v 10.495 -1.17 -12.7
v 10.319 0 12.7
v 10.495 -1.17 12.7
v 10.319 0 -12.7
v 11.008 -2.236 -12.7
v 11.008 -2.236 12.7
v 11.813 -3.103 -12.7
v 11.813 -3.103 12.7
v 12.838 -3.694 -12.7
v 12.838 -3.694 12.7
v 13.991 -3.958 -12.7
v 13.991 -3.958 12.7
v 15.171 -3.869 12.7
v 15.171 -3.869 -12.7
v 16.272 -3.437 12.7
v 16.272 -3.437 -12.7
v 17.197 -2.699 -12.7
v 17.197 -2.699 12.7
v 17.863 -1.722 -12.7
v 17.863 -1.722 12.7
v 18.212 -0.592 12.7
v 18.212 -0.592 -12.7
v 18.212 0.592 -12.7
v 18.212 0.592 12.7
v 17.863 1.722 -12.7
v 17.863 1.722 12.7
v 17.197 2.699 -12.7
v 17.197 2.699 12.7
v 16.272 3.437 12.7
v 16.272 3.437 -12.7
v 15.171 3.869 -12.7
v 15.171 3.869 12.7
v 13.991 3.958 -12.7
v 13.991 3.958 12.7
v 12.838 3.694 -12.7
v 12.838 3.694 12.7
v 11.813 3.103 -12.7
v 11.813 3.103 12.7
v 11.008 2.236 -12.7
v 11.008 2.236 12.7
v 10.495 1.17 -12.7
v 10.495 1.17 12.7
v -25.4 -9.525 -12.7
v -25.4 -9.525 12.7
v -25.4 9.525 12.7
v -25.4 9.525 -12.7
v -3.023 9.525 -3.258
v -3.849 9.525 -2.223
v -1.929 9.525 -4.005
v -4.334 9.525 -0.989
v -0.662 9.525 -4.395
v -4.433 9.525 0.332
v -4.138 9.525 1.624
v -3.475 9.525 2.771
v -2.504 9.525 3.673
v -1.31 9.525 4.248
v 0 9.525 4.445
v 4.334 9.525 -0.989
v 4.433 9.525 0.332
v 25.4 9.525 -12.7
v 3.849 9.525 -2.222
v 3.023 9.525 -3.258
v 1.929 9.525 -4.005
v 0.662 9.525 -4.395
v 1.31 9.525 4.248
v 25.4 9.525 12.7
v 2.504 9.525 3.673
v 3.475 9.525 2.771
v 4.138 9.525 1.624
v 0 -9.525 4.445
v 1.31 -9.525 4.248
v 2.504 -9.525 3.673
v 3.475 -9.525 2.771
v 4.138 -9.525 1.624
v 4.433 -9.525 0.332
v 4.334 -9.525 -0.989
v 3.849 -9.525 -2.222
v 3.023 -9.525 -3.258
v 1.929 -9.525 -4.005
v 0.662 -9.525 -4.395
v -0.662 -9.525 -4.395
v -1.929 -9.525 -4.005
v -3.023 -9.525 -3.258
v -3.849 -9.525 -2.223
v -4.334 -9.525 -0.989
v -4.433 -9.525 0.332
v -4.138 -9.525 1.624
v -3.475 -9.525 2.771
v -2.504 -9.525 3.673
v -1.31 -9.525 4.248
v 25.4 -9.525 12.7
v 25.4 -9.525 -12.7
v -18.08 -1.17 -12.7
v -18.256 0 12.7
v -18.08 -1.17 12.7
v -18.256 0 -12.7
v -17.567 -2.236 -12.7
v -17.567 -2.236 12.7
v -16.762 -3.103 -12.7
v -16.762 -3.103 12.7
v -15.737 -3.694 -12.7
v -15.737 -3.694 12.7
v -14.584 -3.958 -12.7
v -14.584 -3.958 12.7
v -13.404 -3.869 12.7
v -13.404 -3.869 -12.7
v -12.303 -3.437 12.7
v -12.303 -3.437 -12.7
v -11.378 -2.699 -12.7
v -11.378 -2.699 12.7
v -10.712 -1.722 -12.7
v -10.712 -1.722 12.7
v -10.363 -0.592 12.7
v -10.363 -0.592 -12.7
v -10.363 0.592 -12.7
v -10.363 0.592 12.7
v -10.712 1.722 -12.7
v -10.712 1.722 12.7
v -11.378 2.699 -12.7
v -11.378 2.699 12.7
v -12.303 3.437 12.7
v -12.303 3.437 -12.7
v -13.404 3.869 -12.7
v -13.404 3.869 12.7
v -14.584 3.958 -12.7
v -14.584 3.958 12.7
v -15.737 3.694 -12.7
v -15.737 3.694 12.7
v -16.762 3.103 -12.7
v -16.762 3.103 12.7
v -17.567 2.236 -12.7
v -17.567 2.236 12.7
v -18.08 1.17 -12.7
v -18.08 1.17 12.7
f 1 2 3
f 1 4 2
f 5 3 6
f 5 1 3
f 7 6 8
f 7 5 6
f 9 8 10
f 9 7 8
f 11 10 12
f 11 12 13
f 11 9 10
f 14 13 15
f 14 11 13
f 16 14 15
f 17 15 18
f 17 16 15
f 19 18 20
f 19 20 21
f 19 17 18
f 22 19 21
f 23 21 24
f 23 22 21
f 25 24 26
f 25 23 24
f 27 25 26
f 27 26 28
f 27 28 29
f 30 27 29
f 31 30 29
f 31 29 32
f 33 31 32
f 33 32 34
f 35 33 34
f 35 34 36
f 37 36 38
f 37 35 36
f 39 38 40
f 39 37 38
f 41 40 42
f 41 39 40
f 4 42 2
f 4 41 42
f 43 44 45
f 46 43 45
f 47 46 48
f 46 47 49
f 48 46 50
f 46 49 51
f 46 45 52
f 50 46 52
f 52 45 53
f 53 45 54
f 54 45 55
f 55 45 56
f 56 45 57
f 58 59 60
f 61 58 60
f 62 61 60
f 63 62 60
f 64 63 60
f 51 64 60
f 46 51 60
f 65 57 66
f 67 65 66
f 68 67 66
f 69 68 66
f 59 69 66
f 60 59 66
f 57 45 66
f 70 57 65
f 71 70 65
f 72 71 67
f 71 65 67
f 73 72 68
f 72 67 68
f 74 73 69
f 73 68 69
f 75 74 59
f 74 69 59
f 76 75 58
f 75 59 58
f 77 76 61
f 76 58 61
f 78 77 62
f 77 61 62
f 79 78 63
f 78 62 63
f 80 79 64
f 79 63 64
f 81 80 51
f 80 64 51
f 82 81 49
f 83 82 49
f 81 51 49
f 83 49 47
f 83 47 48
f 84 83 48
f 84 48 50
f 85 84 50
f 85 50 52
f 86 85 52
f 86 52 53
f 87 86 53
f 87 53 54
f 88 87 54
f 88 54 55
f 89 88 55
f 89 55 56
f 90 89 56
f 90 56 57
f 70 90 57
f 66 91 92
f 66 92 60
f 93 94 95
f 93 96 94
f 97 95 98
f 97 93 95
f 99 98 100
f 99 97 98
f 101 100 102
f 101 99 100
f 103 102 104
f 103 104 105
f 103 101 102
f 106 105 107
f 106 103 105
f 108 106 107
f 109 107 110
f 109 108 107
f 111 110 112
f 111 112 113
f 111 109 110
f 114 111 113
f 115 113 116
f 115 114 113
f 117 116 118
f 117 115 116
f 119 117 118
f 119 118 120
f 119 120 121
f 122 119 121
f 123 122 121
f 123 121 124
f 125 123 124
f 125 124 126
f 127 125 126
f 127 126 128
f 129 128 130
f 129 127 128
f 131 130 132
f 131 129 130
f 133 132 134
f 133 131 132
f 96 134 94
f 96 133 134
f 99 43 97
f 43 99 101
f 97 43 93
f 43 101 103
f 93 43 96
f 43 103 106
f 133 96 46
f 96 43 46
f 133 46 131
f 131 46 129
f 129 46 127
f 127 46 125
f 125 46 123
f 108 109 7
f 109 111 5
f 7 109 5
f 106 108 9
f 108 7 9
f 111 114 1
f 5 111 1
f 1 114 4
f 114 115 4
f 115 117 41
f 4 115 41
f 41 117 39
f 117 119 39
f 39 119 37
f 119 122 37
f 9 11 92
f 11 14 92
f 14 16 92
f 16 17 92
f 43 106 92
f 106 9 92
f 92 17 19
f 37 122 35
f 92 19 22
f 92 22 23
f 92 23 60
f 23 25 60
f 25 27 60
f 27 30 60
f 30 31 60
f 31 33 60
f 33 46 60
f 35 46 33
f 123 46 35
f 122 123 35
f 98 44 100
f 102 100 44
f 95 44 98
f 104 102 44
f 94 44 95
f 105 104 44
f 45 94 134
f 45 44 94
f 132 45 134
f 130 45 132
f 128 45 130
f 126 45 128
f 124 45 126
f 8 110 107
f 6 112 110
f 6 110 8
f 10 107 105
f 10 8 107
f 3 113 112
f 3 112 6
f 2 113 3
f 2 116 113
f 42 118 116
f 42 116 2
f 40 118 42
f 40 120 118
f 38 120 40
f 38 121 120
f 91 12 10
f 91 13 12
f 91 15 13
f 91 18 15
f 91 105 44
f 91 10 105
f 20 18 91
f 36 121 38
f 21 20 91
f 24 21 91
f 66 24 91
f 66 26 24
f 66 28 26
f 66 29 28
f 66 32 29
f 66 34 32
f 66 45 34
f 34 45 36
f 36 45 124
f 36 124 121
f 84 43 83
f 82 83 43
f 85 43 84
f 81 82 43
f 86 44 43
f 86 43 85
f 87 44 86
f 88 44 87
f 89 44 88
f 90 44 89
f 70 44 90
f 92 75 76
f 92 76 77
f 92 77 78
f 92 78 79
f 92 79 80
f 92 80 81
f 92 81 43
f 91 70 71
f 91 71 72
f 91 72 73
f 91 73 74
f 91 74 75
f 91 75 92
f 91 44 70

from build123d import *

# Parameters (mm, degrees)
SKETCH1_W           = 50.8
SKETCH1_H           = 19.05
SKETCH1_R           = 3.96875
BOSS_EXTRUDE1_DEPTH = 12.7
SKETCH2_R           = 4.445
CUT_EXTRUDE1_DEPTH  = 35.195796525


with BuildPart() as part:
    # Sketch1 → Boss-Extrude1 (new, symmetric)
    with BuildSketch(Plane.XY):
        Rectangle(SKETCH1_W, SKETCH1_H)
        with Locations(Location((-14.2875, 0, 0), (0, 0, 180))):
            Circle(SKETCH1_R, mode=Mode.SUBTRACT)
        with Locations(Location((14.2875, 0, 0), (0, 0, 180))):
            Circle(SKETCH1_R, mode=Mode.SUBTRACT)
    extrude(amount=BOSS_EXTRUDE1_DEPTH, both=True)

    # Sketch2 → Cut-Extrude1 (cut, through all)
    with BuildSketch(Plane(origin=(0, 9.525, 0), x_dir=(1, 0, 0), z_dir=(0, 1, 0))):
        with Locations(Location((0, 0, 0), (0, 0, 270))):
            Circle(SKETCH2_R)
    extrude(amount=-CUT_EXTRUDE1_DEPTH, mode=Mode.SUBTRACT)


solid = part.part
